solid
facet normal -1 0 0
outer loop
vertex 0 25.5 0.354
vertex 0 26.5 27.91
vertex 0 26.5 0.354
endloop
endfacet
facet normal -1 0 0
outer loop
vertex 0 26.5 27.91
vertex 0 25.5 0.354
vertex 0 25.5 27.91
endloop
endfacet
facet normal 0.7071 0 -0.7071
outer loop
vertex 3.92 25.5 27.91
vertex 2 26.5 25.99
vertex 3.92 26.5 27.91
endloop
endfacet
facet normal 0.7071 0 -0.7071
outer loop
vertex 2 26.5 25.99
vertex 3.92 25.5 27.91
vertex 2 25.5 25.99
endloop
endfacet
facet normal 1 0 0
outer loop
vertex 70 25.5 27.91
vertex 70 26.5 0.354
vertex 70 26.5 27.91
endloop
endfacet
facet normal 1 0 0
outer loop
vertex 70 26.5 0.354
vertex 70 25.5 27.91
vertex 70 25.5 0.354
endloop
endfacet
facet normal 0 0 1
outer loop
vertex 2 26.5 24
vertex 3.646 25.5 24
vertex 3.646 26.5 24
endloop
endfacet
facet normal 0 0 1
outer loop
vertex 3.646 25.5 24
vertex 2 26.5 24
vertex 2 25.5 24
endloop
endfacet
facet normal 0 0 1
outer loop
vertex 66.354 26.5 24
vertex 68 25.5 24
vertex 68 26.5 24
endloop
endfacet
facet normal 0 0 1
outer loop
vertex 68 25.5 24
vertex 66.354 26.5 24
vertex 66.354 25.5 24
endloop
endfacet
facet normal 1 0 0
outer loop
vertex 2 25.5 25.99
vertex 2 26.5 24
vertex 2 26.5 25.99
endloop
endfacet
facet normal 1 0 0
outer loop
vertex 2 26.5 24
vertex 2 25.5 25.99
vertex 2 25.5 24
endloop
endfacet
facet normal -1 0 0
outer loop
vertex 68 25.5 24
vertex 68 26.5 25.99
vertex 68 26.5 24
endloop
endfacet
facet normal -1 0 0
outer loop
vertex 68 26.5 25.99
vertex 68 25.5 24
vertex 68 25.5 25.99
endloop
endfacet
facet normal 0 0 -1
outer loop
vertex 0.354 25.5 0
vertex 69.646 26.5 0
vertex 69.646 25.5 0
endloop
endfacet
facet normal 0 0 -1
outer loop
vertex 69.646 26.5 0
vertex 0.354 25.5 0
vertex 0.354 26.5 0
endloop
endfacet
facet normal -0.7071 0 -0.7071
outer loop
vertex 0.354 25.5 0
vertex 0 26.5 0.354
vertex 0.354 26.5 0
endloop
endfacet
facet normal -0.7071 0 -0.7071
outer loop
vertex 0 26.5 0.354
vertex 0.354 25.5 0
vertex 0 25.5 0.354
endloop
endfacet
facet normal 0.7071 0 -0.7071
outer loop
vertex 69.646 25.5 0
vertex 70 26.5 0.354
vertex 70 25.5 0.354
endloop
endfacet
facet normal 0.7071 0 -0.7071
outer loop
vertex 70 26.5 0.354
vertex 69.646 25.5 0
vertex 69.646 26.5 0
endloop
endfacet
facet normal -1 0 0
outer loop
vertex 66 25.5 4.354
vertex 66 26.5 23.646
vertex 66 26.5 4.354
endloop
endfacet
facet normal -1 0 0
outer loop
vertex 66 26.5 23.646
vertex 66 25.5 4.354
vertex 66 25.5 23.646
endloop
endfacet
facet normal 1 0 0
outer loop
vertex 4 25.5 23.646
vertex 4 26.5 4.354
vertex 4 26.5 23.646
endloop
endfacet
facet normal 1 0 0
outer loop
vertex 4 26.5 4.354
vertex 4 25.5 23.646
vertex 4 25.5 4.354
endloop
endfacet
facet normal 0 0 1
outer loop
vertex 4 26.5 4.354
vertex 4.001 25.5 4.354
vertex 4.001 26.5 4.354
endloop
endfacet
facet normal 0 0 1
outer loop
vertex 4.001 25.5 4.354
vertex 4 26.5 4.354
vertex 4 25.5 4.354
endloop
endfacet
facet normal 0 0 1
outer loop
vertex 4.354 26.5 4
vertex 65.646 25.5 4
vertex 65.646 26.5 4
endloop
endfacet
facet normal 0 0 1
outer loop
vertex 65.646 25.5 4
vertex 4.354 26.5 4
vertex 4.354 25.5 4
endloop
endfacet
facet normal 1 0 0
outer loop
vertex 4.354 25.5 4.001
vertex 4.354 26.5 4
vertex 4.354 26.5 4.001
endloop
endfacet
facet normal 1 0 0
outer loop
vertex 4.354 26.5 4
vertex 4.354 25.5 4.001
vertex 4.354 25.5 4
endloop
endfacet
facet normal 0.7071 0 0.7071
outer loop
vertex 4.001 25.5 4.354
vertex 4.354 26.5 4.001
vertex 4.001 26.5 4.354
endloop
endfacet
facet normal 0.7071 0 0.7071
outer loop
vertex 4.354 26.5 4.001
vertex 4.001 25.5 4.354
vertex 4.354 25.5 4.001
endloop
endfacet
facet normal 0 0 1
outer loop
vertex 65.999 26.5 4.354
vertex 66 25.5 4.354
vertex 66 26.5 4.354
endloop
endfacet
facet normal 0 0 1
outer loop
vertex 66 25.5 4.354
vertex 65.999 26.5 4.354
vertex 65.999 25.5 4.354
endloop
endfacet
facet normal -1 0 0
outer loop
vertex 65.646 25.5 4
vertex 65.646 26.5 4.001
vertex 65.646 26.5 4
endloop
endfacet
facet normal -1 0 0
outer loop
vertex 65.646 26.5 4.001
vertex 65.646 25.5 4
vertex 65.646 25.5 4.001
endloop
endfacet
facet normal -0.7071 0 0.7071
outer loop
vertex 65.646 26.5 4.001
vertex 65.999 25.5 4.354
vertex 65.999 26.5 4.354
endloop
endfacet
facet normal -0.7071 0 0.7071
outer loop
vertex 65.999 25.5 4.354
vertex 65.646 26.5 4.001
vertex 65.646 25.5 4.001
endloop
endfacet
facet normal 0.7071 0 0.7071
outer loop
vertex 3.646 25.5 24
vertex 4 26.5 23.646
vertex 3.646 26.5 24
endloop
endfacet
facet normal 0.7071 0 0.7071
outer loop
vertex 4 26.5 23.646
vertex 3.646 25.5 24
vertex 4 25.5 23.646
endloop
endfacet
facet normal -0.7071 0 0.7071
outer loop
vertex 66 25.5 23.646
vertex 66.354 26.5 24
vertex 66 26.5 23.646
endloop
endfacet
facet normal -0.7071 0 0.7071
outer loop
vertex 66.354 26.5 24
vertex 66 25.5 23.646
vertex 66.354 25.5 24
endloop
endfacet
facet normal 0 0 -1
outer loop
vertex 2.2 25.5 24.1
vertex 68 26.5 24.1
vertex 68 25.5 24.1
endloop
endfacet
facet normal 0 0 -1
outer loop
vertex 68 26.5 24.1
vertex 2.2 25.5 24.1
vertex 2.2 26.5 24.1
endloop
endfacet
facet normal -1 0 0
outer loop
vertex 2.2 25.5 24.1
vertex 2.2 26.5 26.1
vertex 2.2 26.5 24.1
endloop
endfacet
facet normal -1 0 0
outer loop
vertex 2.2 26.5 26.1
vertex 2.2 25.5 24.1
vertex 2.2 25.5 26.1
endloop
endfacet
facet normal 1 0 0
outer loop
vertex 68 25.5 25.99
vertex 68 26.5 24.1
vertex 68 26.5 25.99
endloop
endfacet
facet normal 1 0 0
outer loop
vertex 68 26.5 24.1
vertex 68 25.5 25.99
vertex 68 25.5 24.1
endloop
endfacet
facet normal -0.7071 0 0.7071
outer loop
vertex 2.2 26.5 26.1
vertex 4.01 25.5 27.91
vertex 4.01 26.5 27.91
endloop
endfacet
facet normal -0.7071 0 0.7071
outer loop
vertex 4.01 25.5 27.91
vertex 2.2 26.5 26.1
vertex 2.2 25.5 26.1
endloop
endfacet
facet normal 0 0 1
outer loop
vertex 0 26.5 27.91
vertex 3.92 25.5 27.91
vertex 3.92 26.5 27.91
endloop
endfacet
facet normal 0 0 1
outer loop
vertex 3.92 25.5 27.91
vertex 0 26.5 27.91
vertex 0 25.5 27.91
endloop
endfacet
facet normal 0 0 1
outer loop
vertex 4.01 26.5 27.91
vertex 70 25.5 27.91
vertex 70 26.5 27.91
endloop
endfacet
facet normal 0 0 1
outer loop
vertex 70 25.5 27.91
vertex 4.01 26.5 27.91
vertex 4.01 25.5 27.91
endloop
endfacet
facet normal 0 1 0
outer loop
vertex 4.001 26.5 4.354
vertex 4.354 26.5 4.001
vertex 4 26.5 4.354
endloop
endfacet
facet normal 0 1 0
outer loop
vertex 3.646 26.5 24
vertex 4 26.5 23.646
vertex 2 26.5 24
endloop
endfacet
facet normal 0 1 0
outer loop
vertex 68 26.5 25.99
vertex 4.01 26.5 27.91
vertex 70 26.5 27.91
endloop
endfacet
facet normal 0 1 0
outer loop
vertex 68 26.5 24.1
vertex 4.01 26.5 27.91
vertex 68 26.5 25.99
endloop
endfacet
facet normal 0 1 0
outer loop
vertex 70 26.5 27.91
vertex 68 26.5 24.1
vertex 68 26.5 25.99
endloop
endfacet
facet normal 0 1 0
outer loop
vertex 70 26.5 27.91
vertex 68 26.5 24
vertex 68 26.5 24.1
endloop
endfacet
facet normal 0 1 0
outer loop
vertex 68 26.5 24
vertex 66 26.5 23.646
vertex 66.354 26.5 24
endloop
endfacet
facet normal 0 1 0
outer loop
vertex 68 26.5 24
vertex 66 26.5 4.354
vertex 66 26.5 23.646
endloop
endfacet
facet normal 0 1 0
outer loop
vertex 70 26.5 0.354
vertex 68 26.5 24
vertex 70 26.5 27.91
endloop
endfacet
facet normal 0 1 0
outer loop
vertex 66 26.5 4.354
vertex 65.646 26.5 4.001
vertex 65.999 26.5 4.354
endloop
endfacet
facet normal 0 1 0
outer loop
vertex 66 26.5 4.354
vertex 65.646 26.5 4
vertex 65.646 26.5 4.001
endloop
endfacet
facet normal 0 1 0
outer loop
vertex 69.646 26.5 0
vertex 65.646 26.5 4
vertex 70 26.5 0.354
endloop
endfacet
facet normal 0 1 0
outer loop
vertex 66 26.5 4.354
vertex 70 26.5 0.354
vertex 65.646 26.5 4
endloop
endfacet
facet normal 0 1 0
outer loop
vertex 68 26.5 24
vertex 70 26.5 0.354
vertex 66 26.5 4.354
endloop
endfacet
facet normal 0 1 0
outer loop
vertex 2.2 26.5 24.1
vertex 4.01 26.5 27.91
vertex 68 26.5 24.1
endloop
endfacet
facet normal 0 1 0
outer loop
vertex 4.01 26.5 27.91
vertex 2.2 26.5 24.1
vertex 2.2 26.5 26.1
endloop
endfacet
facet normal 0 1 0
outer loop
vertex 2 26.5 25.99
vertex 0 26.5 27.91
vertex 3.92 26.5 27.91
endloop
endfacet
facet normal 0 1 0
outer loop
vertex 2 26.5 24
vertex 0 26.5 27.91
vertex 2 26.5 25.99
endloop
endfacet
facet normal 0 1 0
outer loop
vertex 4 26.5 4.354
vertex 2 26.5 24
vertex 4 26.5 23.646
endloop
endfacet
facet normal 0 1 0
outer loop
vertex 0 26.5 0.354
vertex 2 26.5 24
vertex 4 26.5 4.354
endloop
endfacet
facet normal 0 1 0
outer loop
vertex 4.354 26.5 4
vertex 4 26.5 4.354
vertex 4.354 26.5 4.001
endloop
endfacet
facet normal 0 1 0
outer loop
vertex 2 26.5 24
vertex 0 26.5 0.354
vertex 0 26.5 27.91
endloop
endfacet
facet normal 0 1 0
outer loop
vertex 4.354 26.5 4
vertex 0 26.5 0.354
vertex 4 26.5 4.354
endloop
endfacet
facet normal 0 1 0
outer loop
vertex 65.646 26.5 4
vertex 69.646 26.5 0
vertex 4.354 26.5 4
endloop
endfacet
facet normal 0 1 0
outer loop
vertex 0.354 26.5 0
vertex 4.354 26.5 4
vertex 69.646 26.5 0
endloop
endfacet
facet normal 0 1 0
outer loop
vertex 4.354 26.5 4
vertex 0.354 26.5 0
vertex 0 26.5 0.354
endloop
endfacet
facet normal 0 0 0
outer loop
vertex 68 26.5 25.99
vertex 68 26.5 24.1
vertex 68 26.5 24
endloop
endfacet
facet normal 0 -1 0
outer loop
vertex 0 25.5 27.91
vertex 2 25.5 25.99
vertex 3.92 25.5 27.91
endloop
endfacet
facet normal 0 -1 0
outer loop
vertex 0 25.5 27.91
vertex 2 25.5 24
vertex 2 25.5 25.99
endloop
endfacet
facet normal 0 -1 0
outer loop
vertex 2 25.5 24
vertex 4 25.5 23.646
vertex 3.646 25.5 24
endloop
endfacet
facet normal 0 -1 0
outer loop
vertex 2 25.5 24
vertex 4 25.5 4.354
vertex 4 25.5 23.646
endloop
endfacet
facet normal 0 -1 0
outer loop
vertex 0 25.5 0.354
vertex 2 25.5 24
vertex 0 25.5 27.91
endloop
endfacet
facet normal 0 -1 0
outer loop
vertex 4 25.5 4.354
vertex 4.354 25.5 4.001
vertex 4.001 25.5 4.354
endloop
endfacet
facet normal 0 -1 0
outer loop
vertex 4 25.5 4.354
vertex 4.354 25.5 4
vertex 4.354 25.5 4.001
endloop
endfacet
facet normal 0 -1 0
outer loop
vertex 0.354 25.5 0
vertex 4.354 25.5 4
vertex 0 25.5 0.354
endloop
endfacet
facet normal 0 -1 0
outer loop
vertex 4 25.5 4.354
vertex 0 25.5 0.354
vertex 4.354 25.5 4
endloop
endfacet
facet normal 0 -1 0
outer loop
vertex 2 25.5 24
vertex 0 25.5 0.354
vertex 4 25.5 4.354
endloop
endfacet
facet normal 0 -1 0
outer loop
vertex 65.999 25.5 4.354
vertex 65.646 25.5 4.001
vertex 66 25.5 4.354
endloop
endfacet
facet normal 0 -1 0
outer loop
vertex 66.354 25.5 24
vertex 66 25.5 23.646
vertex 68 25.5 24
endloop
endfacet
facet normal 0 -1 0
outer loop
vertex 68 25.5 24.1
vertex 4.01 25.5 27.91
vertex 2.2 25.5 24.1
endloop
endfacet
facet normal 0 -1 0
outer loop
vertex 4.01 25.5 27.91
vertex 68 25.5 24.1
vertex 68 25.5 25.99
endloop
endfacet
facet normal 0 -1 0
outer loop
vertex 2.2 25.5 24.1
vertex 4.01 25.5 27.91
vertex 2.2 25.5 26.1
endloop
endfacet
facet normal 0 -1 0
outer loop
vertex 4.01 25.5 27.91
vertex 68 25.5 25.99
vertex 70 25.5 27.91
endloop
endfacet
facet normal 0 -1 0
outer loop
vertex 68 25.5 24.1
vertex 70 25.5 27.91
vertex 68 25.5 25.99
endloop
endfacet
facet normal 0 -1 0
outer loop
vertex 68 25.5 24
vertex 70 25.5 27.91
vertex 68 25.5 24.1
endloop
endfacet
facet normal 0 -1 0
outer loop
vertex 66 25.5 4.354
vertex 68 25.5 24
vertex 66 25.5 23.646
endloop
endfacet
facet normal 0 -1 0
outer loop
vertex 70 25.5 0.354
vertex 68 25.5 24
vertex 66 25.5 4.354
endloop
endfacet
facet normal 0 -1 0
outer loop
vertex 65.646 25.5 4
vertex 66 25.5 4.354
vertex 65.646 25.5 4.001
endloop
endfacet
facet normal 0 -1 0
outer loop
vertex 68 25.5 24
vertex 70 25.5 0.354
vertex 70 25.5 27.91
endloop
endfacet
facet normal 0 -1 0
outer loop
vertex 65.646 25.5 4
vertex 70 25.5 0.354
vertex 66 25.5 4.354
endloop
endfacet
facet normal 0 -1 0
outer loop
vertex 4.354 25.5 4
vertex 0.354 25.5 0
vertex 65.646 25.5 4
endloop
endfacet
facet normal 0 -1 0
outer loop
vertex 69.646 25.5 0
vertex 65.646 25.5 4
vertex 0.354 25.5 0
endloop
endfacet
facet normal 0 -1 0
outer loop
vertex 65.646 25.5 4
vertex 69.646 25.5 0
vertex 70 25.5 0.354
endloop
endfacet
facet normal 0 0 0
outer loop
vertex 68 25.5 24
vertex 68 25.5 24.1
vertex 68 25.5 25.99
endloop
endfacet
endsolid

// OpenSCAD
// Test: Sliding lid rail clearance cutaway
include <../../../release/lib/boardgame_insert_toolkit_lib.4.scad>;

wall = 4;
box_xyz = [70, 52, 24];
interior_xyz = [box_xyz[k_x] - 2*wall, box_xyz[k_y] - 2*wall, box_xyz[k_z] - wall];
tolerance = 0.1;

lid_thickness = wall;
sliding_lid_bevel = max(HULL_EPSILON, min(lid_thickness / 2, wall / 2));
sliding_lid_groove_depth = sliding_lid_bevel;
sliding_lid_rail_width = max(HULL_EPSILON, wall - sliding_lid_groove_depth);
sliding_lid_fit_tolerance = max(0, tolerance);
sliding_lid_rail_side_clearance = sliding_lid_rail_width + 2*sliding_lid_fit_tolerance;
sliding_lid_panel_thickness = max(HULL_EPSILON, lid_thickness - 2*sliding_lid_fit_tolerance);
lid_lift = sliding_lid_fit_tolerance;
cutaway_height = box_xyz[k_z] + lid_lift + sliding_lid_panel_thickness + 2*HULL_EPSILON;
section_depth = 1;
section_y = box_xyz[k_y] / 2 - section_depth / 2;

box_object = [
    OBJECT_BOX,
    [ NAME, "sliding rail clearance" ],
    [ BOX_SIZE_XYZ, box_xyz ],
    [ BOX_WALL_THICKNESS, wall ],
    [ BOX_LID,
        [ LID_TYPE, LID_SLIDING ],
        [ LID_SLIDE_SIDE, FRONT ],
        [ LID_SOLID_B, true ],
    ],
    [ BOX_FEATURE,
        [ FTR_COMPARTMENT_SIZE_XYZ, interior_xyz ],
    ],
];

box_data = [
    [ G_PRINT_LID_B, false ],
    [ G_PRINT_BOX_B, true ],
    [ G_ISOLATED_PRINT_BOX, "" ],
    [ G_TOLERANCE, tolerance ],
    [ G_DETENT_THICKNESS, 0.5 ],
    box_object,
];

lid_data = [
    [ G_PRINT_LID_B, true ],
    [ G_PRINT_BOX_B, false ],
    [ G_ISOLATED_PRINT_BOX, "" ],
    [ G_TOLERANCE, tolerance ],
    [ G_DETENT_THICKNESS, 0.5 ],
    box_object,
];

module ClosedSlidingLid()
{
    Make(box_data);

    translate([
        sliding_lid_rail_side_clearance,
        -box_xyz[k_y] - DISTANCE_BETWEEN_PARTS,
        box_xyz[k_z] + lid_lift
    ])
        Make(lid_data);
}

intersection()
{
    ClosedSlidingLid();

    // Full-width front section through the rail channel. Keeping only a thin
    // depth slice removes the back plane and avoids projection overlap.
    translate([-HULL_EPSILON, section_y, -HULL_EPSILON])
        cube([
            box_xyz[k_x] + 2*HULL_EPSILON,
            section_depth,
            cutaway_height
        ]);
}
